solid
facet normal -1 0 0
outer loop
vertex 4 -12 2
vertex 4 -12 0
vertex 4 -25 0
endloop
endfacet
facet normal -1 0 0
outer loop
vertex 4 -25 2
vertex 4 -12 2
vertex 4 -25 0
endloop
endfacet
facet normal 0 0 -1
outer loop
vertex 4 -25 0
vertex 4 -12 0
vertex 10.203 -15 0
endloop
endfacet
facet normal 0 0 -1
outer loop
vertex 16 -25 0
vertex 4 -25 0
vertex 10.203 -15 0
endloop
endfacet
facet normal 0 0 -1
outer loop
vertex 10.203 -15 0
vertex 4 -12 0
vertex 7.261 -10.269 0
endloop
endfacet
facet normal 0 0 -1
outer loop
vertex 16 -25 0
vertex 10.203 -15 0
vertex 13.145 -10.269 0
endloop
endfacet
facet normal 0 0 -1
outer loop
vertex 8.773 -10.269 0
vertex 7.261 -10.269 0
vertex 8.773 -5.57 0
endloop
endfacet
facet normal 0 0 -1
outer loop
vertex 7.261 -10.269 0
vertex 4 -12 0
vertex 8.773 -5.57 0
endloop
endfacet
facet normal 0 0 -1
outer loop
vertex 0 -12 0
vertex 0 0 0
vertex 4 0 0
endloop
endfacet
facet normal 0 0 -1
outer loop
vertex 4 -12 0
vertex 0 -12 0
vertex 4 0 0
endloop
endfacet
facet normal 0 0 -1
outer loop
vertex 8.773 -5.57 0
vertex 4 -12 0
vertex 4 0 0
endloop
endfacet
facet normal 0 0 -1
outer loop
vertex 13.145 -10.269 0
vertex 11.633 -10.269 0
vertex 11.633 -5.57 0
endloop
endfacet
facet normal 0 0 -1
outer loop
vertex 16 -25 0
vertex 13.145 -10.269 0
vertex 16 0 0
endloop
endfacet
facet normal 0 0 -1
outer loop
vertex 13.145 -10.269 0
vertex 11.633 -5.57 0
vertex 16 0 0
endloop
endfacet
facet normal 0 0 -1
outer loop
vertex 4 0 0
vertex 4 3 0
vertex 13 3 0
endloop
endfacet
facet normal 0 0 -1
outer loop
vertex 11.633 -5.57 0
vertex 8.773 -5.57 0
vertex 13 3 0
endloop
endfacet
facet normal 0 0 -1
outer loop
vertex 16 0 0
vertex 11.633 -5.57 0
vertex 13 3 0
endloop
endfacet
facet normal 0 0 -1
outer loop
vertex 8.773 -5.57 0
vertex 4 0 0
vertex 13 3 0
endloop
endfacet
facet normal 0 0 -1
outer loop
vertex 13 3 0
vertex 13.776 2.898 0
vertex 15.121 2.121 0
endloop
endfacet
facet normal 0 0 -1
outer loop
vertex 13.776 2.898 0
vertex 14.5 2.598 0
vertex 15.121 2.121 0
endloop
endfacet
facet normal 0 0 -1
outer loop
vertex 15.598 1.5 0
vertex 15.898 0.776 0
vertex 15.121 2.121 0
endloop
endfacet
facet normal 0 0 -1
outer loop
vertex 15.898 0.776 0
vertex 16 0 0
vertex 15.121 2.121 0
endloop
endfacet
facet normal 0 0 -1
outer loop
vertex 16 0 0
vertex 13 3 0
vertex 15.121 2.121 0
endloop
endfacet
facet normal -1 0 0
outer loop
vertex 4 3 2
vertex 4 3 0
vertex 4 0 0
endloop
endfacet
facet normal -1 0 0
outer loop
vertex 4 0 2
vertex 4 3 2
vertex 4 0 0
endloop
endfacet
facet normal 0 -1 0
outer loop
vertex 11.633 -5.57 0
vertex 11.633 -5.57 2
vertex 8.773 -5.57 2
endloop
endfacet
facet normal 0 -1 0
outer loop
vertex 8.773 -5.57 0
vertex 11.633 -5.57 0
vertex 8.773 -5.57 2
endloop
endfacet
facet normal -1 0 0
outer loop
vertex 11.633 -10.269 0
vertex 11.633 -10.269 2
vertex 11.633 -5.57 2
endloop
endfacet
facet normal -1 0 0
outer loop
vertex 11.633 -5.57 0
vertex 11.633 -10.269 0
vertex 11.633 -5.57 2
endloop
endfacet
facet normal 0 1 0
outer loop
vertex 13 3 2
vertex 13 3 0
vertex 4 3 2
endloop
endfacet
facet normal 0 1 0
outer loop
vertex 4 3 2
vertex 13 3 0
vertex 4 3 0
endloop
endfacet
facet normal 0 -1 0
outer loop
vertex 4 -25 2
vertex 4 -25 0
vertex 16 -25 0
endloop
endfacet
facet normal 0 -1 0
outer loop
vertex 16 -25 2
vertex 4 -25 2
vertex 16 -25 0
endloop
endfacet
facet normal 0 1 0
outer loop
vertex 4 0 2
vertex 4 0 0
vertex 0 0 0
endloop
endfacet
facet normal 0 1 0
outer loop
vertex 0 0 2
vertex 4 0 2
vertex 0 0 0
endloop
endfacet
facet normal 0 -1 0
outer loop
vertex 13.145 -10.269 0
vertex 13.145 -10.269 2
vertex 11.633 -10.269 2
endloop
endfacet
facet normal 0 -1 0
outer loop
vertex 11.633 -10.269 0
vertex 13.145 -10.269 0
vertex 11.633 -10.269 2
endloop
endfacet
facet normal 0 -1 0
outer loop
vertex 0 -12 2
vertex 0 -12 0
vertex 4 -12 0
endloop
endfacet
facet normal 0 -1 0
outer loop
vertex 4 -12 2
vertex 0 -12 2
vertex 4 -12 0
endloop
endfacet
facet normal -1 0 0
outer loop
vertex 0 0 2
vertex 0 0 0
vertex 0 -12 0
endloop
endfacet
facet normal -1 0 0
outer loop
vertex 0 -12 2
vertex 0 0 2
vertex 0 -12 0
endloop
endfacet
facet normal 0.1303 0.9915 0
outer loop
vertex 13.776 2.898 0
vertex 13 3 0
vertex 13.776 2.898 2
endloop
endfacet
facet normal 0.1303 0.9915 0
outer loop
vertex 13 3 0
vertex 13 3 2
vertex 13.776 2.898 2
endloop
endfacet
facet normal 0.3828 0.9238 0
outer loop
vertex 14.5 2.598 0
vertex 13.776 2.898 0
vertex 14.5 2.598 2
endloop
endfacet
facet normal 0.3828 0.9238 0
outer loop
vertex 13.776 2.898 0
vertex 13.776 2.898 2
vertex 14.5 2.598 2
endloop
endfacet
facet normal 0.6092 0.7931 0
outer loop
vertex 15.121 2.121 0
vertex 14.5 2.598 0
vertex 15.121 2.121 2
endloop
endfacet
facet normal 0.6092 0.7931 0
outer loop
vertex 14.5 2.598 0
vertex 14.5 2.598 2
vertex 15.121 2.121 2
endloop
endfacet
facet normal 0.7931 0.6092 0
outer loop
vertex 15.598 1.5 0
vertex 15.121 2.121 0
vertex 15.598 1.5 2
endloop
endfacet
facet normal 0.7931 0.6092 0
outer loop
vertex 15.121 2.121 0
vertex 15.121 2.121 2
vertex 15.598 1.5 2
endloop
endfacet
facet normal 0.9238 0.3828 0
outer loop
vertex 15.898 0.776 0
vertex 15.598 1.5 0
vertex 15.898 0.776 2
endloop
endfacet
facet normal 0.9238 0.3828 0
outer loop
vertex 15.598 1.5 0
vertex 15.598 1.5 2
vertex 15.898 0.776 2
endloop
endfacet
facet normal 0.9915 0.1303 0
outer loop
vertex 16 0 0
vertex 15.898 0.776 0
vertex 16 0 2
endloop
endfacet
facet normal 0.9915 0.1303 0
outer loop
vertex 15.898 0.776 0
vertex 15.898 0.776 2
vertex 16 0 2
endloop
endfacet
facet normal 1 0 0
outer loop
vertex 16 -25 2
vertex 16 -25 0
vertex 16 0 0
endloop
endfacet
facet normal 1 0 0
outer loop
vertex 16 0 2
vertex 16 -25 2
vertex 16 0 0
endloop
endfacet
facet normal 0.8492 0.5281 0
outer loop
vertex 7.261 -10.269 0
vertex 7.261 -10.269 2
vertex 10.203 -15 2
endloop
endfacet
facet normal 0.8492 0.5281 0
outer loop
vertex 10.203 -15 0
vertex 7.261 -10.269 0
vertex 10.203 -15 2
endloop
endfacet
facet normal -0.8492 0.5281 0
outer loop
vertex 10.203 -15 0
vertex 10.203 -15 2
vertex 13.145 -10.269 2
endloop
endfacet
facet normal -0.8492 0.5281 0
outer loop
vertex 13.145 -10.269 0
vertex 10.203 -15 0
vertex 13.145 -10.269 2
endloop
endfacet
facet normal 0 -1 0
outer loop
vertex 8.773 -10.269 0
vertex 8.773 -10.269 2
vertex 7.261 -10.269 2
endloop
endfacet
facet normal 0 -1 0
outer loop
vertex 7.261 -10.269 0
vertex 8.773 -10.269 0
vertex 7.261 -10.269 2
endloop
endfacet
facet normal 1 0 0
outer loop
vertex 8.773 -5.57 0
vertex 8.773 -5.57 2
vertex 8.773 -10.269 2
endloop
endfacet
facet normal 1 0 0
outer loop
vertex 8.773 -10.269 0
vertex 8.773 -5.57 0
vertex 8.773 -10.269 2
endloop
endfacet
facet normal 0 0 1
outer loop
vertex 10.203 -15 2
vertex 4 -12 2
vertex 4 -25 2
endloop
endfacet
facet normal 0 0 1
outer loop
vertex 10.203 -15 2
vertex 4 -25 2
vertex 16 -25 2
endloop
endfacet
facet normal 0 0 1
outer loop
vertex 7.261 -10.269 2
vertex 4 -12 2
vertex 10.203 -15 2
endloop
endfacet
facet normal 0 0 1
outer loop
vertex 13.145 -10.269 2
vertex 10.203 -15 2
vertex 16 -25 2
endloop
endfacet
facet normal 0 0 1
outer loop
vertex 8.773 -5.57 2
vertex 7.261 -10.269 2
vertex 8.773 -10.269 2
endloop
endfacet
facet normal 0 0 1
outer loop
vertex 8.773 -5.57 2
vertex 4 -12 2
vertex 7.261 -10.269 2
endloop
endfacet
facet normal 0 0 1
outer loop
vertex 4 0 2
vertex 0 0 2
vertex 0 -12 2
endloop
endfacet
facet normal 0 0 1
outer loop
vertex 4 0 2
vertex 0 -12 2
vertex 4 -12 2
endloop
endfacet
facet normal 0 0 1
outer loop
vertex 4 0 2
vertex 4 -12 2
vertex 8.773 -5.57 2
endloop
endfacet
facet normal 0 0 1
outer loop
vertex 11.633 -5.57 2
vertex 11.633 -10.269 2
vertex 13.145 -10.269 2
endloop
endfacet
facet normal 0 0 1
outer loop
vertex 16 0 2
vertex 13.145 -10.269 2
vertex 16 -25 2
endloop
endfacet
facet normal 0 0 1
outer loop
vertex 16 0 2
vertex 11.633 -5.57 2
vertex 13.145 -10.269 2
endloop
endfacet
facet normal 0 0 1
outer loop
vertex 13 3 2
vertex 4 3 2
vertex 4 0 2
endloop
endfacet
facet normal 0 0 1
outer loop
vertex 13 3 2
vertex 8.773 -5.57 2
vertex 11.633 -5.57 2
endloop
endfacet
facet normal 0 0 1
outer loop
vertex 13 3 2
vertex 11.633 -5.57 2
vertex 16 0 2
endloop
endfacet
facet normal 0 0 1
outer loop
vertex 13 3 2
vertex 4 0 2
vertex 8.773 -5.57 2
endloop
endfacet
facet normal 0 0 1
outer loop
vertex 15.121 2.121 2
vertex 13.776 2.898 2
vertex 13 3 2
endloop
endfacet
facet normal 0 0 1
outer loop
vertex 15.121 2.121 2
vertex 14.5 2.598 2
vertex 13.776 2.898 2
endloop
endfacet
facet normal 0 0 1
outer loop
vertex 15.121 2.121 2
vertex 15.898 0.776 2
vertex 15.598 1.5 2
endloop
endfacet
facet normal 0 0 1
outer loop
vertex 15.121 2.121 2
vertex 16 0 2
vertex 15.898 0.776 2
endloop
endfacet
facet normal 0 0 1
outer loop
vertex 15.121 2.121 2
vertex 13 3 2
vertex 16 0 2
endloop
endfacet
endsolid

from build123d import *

# Parameters (mm, degrees)
EXTRUDE_1_DEPTH     = 2
CUT_EXTRUDE_1_DEPTH = 2
FILLET_1_R          = 3


with BuildPart() as part:
    # ｽｹｯﾁ1 → ﾎﾞｽ - 押し出し1 (new body)
    with BuildSketch(Plane.XY):
        Polygon((4, 0), (0, 0), (0, -12), (4, -12), (4, -25), (16, -25), (16, 3), (4, 3), align=None)
    extrude(amount=EXTRUDE_1_DEPTH)

    # ｽｹｯﾁ2 → ｶｯﾄ - 押し出し1 (cut)
    with BuildSketch(Plane.XY.offset(2)):
        Polygon((11.632823949, -5.570087609), (8.772941266, -5.570087609), (8.772941266, -10.268637818), (7.260776917, -10.268637818), (10.202882607, -14.99997105), (13.144988298, -10.268637818), (11.632823949, -10.268637818), align=None)
    extrude(amount=-CUT_EXTRUDE_1_DEPTH, mode=Mode.SUBTRACT)

    # ﾌｨﾚｯﾄ1
    fillet_1_edges = [part.edges().sort_by_distance(p)[0] for p in [
        (16, 3, 1),
    ]]
    fillet(fillet_1_edges, radius=FILLET_1_R)


solid = part.part
